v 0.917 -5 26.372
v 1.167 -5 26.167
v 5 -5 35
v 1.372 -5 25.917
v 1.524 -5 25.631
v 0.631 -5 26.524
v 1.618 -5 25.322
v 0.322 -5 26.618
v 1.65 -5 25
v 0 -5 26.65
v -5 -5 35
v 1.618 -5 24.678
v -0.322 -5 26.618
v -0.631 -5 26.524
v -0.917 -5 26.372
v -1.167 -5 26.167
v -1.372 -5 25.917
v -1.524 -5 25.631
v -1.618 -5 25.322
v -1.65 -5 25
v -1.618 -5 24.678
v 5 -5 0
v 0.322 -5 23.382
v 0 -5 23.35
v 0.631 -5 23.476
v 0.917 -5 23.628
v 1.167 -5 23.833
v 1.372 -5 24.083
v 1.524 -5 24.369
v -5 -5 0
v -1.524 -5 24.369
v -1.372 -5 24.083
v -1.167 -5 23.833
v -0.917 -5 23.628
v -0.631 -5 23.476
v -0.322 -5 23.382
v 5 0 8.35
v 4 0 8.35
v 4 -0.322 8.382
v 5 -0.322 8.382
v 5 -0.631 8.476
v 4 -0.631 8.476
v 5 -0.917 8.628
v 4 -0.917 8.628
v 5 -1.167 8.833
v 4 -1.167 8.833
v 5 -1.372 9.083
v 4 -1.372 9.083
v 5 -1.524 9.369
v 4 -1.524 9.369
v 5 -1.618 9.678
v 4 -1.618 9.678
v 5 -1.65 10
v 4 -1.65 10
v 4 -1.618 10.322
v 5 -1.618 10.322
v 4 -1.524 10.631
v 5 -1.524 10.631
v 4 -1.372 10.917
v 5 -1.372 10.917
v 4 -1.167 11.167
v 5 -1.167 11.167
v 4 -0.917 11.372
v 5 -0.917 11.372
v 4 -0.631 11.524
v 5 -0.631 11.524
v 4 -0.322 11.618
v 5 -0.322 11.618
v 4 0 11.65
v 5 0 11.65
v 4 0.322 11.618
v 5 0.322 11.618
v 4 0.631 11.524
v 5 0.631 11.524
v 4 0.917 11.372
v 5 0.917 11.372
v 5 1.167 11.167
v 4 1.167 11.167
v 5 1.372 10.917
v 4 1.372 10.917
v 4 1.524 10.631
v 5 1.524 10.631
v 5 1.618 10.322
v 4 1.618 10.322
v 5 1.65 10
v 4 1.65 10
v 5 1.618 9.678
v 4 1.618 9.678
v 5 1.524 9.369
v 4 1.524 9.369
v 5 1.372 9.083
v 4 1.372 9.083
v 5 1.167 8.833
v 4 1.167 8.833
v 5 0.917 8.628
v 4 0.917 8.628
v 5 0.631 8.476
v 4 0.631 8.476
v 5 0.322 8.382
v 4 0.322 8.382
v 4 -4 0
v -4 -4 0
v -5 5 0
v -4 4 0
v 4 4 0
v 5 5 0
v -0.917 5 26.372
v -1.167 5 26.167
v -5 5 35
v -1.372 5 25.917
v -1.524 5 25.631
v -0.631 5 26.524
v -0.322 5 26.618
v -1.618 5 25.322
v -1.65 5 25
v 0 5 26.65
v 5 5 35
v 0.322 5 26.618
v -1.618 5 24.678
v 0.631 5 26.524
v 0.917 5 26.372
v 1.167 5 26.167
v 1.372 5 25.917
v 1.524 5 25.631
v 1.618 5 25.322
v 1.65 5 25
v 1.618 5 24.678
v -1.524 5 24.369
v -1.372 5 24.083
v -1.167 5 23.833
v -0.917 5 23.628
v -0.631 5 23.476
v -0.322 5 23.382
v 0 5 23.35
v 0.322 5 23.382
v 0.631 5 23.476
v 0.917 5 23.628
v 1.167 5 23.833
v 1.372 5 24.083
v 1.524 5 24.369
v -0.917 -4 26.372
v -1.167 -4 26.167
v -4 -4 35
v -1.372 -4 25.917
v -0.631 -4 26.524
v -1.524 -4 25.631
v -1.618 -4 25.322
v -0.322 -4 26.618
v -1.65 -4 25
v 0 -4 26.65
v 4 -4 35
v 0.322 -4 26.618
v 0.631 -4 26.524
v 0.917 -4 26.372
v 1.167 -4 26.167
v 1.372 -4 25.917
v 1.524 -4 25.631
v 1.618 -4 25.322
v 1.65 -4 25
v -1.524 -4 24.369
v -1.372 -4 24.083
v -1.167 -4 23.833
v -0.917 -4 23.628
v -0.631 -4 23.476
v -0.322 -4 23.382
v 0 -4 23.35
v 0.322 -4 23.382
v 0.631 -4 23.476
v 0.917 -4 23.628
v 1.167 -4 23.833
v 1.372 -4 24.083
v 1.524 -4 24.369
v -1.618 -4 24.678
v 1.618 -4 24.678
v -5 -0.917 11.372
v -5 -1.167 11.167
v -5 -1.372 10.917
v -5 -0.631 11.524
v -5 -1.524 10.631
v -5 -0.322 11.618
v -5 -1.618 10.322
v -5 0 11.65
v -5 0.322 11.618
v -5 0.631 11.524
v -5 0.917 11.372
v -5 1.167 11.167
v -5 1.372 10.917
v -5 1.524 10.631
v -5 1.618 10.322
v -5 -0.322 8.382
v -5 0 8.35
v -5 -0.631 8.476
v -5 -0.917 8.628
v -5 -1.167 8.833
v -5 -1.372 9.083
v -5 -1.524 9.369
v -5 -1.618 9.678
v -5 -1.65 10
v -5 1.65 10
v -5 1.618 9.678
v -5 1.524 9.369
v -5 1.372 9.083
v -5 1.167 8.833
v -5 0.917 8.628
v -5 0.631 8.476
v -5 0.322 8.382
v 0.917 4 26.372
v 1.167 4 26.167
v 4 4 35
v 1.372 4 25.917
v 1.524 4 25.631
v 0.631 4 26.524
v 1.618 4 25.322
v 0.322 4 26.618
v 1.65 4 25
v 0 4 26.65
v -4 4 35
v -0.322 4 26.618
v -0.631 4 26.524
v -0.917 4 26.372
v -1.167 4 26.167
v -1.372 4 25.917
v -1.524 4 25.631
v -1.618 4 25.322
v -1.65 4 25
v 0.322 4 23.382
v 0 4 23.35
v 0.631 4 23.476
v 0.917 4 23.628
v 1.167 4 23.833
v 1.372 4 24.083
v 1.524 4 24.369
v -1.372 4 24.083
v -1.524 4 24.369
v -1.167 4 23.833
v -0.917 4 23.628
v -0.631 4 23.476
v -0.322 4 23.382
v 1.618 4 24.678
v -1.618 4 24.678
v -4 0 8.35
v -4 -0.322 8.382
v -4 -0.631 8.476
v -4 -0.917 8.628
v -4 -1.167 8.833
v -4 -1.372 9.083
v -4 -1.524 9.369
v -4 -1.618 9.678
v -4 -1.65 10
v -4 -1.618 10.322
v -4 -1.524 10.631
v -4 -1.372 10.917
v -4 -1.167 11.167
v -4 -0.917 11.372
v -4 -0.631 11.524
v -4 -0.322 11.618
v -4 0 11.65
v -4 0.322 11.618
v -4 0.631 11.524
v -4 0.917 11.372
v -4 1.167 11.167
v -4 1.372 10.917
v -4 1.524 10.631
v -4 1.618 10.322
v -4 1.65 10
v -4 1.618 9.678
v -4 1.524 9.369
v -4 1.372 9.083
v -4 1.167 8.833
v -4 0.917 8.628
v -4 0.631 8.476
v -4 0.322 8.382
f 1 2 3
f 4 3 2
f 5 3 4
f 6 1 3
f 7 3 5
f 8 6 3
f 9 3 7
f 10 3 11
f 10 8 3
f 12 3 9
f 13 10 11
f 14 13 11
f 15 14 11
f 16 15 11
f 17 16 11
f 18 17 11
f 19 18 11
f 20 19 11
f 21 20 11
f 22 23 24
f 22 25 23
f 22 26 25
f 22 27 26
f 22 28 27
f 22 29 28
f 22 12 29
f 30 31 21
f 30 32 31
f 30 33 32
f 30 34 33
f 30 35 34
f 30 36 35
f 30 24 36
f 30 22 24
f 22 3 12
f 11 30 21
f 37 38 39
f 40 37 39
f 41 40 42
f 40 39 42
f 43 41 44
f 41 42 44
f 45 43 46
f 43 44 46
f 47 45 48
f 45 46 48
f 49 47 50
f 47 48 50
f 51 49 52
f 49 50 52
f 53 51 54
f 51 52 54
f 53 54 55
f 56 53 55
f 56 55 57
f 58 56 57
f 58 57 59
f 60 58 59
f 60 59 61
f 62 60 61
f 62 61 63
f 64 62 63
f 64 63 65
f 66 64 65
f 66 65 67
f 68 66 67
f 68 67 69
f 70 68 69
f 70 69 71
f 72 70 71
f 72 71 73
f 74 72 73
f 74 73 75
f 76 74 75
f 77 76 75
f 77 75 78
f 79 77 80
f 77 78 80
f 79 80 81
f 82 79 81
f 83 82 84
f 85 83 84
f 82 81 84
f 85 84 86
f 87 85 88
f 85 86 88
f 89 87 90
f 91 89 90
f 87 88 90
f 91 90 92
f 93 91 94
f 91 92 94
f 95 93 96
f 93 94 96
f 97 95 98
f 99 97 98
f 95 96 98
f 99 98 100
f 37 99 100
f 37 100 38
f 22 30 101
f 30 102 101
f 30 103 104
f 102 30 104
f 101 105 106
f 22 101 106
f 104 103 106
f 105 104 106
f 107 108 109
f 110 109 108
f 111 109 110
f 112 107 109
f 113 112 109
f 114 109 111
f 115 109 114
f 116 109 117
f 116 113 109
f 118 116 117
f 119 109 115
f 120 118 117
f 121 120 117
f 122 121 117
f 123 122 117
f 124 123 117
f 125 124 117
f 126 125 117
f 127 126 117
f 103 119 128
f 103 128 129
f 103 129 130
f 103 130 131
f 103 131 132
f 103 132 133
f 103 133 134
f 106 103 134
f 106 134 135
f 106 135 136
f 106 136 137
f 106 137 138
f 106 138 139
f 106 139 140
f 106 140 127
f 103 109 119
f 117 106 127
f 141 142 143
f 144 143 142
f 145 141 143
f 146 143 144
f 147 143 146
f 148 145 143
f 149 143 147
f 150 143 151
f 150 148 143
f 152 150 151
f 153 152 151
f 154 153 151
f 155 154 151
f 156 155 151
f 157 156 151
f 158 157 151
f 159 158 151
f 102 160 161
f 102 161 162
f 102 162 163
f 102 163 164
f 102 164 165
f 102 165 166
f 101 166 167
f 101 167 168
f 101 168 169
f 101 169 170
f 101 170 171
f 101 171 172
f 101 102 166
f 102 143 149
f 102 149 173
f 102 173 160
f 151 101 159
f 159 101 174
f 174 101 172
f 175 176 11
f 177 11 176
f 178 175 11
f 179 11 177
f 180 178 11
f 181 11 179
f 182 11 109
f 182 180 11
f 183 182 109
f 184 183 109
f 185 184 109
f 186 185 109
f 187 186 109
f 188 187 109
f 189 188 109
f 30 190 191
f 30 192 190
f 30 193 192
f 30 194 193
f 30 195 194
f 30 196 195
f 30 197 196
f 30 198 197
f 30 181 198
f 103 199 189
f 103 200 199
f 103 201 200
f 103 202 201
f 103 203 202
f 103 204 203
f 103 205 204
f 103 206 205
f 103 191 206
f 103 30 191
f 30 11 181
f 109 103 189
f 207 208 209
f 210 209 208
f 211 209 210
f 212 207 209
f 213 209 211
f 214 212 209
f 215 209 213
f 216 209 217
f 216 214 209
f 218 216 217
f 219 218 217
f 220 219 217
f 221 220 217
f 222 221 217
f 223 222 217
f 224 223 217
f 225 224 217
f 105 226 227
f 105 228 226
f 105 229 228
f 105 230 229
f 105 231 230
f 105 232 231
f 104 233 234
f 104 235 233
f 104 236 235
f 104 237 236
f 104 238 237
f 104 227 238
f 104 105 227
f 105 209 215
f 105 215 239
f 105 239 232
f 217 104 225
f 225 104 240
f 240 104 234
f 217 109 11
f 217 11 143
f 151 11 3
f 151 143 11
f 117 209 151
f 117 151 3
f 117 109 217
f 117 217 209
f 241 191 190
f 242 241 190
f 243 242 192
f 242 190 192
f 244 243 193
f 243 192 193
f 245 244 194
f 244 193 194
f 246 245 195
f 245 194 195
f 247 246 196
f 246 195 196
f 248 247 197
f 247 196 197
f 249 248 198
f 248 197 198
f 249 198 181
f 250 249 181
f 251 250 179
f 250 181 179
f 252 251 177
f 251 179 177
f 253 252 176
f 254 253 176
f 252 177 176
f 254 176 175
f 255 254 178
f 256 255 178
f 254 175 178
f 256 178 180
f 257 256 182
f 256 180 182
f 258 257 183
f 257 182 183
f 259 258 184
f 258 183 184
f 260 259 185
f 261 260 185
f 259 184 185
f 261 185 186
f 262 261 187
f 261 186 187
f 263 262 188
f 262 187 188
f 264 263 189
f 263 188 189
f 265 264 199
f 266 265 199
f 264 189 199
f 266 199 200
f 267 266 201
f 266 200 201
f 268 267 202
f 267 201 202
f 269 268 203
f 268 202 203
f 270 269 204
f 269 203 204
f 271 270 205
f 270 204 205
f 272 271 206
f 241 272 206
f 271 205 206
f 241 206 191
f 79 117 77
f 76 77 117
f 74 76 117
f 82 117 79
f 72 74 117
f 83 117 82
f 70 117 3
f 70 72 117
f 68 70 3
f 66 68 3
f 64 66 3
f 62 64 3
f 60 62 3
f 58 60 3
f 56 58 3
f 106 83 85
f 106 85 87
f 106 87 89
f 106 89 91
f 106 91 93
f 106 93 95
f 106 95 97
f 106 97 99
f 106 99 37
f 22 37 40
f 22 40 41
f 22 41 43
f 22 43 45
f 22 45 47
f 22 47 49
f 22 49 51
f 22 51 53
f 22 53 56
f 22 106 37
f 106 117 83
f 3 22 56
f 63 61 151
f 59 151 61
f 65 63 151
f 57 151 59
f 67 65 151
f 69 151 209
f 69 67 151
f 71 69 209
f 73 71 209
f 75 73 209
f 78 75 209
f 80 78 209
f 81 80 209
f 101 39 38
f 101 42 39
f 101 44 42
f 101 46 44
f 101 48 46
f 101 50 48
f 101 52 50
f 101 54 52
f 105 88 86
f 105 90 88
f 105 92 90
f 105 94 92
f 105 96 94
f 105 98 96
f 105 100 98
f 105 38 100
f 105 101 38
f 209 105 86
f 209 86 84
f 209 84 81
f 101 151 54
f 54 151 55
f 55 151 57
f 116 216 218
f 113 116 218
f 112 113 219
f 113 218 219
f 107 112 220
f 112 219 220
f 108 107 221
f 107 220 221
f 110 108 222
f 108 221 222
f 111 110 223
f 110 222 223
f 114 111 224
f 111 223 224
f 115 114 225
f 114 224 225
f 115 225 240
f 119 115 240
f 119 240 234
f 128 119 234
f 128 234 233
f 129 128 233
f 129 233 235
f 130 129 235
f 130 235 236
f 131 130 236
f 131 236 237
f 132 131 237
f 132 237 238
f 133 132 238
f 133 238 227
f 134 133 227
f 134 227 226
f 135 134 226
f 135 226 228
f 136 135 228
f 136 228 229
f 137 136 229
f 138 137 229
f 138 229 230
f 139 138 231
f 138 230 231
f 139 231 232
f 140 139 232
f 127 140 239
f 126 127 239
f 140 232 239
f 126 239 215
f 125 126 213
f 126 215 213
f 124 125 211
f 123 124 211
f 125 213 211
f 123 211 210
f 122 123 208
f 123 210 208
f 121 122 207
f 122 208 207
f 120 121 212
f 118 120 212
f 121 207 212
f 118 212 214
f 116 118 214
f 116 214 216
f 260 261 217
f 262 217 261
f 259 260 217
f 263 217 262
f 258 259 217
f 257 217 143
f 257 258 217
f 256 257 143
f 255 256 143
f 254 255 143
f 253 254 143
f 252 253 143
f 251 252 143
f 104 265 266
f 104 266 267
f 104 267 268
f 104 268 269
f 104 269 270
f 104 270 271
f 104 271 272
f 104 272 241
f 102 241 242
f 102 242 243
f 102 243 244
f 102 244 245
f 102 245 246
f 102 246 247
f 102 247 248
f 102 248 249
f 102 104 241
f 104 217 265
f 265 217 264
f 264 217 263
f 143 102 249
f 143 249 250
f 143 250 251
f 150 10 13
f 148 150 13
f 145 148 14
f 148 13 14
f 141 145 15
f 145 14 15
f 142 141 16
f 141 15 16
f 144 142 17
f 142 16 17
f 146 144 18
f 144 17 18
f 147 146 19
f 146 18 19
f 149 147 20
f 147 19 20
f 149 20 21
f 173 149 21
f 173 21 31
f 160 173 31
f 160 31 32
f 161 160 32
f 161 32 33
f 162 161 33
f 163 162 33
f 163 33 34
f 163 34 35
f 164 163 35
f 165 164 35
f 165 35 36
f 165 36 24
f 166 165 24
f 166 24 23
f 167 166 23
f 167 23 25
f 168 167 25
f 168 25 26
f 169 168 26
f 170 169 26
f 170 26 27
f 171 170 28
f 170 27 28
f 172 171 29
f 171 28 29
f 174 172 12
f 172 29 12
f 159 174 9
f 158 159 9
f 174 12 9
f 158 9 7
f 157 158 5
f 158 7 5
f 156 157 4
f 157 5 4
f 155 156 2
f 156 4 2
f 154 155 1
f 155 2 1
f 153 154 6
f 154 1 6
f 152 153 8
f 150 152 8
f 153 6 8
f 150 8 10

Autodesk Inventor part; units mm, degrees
ref_plane "YZ Plane" through (0, 0, 0) normal (1, 0, 0) x (0, 1, 0)
ref_plane "XZ Plane" through (0, 0, 0) normal (0, 1, 0) x (-1, 0, 0)
ref_plane "XY Plane" through (0, 0, 0) normal (0, 0, 1) x (1, 0, 0)
sketch "スケッチ1" plane through (0, 0, 0) normal (0, 0, 1) x (1, 0, 0)
  line L0 (5, -5) -> (-5, -5)
  line L1 (-5, -5) -> (-5, 5)
  line L2 (-5, 5) -> (5, 5)
  line L3 (5, 5) -> (5, -5)
  line L4 (5, -5) -> (-5, 5) construction
  line L5 (-5, -5) -> (5, 5) construction
  line L6 (4, 4) -> (-4, 4)
  line L7 (-4, 4) -> (-4, -4)
  line L8 (-4, -4) -> (4, -4)
  line L9 (4, -4) -> (4, 4)
  point P0 (0, 0)
  dimension "d0" = 10
  dimension "d1" = 10
  dimension "d2" = 1
extrude "押し出し1" add sketch "スケッチ1" along normal blind 35
sketch "スケッチ2" plane through (5, -5, 0) normal (1, 0, 0) x (0, 0, -1)
  line L0 (-35, 9) -> (-35, 1) projected
  line L1 (-35, 5) -> (0, 5)
  line L2 (0, 9) -> (0, 1) projected
  point P0 (-10, 5)
  dimension "d5" = 10
hole "穴1" at (5, 0, 10) direction (-1, 0, 0) diameter 3.3 end through all
sketch "スケッチ3" plane through (-5, 5, 0) normal (0, 1, 0) x (1, 0, 0)
  line L0 (5, 0) -> (5, -35)
  line L1 (0, -35) -> (10, -35) projected
  line L2 (10, 0) -> (0, 0) projected
  point P0 (5, -25)
  dimension "d13" = 25
hole "穴2" at (0, 5, 25) direction (0, -1, 0) diameter 3.3 end through all
properties part number "small_kaku_1010_santen_1020"
